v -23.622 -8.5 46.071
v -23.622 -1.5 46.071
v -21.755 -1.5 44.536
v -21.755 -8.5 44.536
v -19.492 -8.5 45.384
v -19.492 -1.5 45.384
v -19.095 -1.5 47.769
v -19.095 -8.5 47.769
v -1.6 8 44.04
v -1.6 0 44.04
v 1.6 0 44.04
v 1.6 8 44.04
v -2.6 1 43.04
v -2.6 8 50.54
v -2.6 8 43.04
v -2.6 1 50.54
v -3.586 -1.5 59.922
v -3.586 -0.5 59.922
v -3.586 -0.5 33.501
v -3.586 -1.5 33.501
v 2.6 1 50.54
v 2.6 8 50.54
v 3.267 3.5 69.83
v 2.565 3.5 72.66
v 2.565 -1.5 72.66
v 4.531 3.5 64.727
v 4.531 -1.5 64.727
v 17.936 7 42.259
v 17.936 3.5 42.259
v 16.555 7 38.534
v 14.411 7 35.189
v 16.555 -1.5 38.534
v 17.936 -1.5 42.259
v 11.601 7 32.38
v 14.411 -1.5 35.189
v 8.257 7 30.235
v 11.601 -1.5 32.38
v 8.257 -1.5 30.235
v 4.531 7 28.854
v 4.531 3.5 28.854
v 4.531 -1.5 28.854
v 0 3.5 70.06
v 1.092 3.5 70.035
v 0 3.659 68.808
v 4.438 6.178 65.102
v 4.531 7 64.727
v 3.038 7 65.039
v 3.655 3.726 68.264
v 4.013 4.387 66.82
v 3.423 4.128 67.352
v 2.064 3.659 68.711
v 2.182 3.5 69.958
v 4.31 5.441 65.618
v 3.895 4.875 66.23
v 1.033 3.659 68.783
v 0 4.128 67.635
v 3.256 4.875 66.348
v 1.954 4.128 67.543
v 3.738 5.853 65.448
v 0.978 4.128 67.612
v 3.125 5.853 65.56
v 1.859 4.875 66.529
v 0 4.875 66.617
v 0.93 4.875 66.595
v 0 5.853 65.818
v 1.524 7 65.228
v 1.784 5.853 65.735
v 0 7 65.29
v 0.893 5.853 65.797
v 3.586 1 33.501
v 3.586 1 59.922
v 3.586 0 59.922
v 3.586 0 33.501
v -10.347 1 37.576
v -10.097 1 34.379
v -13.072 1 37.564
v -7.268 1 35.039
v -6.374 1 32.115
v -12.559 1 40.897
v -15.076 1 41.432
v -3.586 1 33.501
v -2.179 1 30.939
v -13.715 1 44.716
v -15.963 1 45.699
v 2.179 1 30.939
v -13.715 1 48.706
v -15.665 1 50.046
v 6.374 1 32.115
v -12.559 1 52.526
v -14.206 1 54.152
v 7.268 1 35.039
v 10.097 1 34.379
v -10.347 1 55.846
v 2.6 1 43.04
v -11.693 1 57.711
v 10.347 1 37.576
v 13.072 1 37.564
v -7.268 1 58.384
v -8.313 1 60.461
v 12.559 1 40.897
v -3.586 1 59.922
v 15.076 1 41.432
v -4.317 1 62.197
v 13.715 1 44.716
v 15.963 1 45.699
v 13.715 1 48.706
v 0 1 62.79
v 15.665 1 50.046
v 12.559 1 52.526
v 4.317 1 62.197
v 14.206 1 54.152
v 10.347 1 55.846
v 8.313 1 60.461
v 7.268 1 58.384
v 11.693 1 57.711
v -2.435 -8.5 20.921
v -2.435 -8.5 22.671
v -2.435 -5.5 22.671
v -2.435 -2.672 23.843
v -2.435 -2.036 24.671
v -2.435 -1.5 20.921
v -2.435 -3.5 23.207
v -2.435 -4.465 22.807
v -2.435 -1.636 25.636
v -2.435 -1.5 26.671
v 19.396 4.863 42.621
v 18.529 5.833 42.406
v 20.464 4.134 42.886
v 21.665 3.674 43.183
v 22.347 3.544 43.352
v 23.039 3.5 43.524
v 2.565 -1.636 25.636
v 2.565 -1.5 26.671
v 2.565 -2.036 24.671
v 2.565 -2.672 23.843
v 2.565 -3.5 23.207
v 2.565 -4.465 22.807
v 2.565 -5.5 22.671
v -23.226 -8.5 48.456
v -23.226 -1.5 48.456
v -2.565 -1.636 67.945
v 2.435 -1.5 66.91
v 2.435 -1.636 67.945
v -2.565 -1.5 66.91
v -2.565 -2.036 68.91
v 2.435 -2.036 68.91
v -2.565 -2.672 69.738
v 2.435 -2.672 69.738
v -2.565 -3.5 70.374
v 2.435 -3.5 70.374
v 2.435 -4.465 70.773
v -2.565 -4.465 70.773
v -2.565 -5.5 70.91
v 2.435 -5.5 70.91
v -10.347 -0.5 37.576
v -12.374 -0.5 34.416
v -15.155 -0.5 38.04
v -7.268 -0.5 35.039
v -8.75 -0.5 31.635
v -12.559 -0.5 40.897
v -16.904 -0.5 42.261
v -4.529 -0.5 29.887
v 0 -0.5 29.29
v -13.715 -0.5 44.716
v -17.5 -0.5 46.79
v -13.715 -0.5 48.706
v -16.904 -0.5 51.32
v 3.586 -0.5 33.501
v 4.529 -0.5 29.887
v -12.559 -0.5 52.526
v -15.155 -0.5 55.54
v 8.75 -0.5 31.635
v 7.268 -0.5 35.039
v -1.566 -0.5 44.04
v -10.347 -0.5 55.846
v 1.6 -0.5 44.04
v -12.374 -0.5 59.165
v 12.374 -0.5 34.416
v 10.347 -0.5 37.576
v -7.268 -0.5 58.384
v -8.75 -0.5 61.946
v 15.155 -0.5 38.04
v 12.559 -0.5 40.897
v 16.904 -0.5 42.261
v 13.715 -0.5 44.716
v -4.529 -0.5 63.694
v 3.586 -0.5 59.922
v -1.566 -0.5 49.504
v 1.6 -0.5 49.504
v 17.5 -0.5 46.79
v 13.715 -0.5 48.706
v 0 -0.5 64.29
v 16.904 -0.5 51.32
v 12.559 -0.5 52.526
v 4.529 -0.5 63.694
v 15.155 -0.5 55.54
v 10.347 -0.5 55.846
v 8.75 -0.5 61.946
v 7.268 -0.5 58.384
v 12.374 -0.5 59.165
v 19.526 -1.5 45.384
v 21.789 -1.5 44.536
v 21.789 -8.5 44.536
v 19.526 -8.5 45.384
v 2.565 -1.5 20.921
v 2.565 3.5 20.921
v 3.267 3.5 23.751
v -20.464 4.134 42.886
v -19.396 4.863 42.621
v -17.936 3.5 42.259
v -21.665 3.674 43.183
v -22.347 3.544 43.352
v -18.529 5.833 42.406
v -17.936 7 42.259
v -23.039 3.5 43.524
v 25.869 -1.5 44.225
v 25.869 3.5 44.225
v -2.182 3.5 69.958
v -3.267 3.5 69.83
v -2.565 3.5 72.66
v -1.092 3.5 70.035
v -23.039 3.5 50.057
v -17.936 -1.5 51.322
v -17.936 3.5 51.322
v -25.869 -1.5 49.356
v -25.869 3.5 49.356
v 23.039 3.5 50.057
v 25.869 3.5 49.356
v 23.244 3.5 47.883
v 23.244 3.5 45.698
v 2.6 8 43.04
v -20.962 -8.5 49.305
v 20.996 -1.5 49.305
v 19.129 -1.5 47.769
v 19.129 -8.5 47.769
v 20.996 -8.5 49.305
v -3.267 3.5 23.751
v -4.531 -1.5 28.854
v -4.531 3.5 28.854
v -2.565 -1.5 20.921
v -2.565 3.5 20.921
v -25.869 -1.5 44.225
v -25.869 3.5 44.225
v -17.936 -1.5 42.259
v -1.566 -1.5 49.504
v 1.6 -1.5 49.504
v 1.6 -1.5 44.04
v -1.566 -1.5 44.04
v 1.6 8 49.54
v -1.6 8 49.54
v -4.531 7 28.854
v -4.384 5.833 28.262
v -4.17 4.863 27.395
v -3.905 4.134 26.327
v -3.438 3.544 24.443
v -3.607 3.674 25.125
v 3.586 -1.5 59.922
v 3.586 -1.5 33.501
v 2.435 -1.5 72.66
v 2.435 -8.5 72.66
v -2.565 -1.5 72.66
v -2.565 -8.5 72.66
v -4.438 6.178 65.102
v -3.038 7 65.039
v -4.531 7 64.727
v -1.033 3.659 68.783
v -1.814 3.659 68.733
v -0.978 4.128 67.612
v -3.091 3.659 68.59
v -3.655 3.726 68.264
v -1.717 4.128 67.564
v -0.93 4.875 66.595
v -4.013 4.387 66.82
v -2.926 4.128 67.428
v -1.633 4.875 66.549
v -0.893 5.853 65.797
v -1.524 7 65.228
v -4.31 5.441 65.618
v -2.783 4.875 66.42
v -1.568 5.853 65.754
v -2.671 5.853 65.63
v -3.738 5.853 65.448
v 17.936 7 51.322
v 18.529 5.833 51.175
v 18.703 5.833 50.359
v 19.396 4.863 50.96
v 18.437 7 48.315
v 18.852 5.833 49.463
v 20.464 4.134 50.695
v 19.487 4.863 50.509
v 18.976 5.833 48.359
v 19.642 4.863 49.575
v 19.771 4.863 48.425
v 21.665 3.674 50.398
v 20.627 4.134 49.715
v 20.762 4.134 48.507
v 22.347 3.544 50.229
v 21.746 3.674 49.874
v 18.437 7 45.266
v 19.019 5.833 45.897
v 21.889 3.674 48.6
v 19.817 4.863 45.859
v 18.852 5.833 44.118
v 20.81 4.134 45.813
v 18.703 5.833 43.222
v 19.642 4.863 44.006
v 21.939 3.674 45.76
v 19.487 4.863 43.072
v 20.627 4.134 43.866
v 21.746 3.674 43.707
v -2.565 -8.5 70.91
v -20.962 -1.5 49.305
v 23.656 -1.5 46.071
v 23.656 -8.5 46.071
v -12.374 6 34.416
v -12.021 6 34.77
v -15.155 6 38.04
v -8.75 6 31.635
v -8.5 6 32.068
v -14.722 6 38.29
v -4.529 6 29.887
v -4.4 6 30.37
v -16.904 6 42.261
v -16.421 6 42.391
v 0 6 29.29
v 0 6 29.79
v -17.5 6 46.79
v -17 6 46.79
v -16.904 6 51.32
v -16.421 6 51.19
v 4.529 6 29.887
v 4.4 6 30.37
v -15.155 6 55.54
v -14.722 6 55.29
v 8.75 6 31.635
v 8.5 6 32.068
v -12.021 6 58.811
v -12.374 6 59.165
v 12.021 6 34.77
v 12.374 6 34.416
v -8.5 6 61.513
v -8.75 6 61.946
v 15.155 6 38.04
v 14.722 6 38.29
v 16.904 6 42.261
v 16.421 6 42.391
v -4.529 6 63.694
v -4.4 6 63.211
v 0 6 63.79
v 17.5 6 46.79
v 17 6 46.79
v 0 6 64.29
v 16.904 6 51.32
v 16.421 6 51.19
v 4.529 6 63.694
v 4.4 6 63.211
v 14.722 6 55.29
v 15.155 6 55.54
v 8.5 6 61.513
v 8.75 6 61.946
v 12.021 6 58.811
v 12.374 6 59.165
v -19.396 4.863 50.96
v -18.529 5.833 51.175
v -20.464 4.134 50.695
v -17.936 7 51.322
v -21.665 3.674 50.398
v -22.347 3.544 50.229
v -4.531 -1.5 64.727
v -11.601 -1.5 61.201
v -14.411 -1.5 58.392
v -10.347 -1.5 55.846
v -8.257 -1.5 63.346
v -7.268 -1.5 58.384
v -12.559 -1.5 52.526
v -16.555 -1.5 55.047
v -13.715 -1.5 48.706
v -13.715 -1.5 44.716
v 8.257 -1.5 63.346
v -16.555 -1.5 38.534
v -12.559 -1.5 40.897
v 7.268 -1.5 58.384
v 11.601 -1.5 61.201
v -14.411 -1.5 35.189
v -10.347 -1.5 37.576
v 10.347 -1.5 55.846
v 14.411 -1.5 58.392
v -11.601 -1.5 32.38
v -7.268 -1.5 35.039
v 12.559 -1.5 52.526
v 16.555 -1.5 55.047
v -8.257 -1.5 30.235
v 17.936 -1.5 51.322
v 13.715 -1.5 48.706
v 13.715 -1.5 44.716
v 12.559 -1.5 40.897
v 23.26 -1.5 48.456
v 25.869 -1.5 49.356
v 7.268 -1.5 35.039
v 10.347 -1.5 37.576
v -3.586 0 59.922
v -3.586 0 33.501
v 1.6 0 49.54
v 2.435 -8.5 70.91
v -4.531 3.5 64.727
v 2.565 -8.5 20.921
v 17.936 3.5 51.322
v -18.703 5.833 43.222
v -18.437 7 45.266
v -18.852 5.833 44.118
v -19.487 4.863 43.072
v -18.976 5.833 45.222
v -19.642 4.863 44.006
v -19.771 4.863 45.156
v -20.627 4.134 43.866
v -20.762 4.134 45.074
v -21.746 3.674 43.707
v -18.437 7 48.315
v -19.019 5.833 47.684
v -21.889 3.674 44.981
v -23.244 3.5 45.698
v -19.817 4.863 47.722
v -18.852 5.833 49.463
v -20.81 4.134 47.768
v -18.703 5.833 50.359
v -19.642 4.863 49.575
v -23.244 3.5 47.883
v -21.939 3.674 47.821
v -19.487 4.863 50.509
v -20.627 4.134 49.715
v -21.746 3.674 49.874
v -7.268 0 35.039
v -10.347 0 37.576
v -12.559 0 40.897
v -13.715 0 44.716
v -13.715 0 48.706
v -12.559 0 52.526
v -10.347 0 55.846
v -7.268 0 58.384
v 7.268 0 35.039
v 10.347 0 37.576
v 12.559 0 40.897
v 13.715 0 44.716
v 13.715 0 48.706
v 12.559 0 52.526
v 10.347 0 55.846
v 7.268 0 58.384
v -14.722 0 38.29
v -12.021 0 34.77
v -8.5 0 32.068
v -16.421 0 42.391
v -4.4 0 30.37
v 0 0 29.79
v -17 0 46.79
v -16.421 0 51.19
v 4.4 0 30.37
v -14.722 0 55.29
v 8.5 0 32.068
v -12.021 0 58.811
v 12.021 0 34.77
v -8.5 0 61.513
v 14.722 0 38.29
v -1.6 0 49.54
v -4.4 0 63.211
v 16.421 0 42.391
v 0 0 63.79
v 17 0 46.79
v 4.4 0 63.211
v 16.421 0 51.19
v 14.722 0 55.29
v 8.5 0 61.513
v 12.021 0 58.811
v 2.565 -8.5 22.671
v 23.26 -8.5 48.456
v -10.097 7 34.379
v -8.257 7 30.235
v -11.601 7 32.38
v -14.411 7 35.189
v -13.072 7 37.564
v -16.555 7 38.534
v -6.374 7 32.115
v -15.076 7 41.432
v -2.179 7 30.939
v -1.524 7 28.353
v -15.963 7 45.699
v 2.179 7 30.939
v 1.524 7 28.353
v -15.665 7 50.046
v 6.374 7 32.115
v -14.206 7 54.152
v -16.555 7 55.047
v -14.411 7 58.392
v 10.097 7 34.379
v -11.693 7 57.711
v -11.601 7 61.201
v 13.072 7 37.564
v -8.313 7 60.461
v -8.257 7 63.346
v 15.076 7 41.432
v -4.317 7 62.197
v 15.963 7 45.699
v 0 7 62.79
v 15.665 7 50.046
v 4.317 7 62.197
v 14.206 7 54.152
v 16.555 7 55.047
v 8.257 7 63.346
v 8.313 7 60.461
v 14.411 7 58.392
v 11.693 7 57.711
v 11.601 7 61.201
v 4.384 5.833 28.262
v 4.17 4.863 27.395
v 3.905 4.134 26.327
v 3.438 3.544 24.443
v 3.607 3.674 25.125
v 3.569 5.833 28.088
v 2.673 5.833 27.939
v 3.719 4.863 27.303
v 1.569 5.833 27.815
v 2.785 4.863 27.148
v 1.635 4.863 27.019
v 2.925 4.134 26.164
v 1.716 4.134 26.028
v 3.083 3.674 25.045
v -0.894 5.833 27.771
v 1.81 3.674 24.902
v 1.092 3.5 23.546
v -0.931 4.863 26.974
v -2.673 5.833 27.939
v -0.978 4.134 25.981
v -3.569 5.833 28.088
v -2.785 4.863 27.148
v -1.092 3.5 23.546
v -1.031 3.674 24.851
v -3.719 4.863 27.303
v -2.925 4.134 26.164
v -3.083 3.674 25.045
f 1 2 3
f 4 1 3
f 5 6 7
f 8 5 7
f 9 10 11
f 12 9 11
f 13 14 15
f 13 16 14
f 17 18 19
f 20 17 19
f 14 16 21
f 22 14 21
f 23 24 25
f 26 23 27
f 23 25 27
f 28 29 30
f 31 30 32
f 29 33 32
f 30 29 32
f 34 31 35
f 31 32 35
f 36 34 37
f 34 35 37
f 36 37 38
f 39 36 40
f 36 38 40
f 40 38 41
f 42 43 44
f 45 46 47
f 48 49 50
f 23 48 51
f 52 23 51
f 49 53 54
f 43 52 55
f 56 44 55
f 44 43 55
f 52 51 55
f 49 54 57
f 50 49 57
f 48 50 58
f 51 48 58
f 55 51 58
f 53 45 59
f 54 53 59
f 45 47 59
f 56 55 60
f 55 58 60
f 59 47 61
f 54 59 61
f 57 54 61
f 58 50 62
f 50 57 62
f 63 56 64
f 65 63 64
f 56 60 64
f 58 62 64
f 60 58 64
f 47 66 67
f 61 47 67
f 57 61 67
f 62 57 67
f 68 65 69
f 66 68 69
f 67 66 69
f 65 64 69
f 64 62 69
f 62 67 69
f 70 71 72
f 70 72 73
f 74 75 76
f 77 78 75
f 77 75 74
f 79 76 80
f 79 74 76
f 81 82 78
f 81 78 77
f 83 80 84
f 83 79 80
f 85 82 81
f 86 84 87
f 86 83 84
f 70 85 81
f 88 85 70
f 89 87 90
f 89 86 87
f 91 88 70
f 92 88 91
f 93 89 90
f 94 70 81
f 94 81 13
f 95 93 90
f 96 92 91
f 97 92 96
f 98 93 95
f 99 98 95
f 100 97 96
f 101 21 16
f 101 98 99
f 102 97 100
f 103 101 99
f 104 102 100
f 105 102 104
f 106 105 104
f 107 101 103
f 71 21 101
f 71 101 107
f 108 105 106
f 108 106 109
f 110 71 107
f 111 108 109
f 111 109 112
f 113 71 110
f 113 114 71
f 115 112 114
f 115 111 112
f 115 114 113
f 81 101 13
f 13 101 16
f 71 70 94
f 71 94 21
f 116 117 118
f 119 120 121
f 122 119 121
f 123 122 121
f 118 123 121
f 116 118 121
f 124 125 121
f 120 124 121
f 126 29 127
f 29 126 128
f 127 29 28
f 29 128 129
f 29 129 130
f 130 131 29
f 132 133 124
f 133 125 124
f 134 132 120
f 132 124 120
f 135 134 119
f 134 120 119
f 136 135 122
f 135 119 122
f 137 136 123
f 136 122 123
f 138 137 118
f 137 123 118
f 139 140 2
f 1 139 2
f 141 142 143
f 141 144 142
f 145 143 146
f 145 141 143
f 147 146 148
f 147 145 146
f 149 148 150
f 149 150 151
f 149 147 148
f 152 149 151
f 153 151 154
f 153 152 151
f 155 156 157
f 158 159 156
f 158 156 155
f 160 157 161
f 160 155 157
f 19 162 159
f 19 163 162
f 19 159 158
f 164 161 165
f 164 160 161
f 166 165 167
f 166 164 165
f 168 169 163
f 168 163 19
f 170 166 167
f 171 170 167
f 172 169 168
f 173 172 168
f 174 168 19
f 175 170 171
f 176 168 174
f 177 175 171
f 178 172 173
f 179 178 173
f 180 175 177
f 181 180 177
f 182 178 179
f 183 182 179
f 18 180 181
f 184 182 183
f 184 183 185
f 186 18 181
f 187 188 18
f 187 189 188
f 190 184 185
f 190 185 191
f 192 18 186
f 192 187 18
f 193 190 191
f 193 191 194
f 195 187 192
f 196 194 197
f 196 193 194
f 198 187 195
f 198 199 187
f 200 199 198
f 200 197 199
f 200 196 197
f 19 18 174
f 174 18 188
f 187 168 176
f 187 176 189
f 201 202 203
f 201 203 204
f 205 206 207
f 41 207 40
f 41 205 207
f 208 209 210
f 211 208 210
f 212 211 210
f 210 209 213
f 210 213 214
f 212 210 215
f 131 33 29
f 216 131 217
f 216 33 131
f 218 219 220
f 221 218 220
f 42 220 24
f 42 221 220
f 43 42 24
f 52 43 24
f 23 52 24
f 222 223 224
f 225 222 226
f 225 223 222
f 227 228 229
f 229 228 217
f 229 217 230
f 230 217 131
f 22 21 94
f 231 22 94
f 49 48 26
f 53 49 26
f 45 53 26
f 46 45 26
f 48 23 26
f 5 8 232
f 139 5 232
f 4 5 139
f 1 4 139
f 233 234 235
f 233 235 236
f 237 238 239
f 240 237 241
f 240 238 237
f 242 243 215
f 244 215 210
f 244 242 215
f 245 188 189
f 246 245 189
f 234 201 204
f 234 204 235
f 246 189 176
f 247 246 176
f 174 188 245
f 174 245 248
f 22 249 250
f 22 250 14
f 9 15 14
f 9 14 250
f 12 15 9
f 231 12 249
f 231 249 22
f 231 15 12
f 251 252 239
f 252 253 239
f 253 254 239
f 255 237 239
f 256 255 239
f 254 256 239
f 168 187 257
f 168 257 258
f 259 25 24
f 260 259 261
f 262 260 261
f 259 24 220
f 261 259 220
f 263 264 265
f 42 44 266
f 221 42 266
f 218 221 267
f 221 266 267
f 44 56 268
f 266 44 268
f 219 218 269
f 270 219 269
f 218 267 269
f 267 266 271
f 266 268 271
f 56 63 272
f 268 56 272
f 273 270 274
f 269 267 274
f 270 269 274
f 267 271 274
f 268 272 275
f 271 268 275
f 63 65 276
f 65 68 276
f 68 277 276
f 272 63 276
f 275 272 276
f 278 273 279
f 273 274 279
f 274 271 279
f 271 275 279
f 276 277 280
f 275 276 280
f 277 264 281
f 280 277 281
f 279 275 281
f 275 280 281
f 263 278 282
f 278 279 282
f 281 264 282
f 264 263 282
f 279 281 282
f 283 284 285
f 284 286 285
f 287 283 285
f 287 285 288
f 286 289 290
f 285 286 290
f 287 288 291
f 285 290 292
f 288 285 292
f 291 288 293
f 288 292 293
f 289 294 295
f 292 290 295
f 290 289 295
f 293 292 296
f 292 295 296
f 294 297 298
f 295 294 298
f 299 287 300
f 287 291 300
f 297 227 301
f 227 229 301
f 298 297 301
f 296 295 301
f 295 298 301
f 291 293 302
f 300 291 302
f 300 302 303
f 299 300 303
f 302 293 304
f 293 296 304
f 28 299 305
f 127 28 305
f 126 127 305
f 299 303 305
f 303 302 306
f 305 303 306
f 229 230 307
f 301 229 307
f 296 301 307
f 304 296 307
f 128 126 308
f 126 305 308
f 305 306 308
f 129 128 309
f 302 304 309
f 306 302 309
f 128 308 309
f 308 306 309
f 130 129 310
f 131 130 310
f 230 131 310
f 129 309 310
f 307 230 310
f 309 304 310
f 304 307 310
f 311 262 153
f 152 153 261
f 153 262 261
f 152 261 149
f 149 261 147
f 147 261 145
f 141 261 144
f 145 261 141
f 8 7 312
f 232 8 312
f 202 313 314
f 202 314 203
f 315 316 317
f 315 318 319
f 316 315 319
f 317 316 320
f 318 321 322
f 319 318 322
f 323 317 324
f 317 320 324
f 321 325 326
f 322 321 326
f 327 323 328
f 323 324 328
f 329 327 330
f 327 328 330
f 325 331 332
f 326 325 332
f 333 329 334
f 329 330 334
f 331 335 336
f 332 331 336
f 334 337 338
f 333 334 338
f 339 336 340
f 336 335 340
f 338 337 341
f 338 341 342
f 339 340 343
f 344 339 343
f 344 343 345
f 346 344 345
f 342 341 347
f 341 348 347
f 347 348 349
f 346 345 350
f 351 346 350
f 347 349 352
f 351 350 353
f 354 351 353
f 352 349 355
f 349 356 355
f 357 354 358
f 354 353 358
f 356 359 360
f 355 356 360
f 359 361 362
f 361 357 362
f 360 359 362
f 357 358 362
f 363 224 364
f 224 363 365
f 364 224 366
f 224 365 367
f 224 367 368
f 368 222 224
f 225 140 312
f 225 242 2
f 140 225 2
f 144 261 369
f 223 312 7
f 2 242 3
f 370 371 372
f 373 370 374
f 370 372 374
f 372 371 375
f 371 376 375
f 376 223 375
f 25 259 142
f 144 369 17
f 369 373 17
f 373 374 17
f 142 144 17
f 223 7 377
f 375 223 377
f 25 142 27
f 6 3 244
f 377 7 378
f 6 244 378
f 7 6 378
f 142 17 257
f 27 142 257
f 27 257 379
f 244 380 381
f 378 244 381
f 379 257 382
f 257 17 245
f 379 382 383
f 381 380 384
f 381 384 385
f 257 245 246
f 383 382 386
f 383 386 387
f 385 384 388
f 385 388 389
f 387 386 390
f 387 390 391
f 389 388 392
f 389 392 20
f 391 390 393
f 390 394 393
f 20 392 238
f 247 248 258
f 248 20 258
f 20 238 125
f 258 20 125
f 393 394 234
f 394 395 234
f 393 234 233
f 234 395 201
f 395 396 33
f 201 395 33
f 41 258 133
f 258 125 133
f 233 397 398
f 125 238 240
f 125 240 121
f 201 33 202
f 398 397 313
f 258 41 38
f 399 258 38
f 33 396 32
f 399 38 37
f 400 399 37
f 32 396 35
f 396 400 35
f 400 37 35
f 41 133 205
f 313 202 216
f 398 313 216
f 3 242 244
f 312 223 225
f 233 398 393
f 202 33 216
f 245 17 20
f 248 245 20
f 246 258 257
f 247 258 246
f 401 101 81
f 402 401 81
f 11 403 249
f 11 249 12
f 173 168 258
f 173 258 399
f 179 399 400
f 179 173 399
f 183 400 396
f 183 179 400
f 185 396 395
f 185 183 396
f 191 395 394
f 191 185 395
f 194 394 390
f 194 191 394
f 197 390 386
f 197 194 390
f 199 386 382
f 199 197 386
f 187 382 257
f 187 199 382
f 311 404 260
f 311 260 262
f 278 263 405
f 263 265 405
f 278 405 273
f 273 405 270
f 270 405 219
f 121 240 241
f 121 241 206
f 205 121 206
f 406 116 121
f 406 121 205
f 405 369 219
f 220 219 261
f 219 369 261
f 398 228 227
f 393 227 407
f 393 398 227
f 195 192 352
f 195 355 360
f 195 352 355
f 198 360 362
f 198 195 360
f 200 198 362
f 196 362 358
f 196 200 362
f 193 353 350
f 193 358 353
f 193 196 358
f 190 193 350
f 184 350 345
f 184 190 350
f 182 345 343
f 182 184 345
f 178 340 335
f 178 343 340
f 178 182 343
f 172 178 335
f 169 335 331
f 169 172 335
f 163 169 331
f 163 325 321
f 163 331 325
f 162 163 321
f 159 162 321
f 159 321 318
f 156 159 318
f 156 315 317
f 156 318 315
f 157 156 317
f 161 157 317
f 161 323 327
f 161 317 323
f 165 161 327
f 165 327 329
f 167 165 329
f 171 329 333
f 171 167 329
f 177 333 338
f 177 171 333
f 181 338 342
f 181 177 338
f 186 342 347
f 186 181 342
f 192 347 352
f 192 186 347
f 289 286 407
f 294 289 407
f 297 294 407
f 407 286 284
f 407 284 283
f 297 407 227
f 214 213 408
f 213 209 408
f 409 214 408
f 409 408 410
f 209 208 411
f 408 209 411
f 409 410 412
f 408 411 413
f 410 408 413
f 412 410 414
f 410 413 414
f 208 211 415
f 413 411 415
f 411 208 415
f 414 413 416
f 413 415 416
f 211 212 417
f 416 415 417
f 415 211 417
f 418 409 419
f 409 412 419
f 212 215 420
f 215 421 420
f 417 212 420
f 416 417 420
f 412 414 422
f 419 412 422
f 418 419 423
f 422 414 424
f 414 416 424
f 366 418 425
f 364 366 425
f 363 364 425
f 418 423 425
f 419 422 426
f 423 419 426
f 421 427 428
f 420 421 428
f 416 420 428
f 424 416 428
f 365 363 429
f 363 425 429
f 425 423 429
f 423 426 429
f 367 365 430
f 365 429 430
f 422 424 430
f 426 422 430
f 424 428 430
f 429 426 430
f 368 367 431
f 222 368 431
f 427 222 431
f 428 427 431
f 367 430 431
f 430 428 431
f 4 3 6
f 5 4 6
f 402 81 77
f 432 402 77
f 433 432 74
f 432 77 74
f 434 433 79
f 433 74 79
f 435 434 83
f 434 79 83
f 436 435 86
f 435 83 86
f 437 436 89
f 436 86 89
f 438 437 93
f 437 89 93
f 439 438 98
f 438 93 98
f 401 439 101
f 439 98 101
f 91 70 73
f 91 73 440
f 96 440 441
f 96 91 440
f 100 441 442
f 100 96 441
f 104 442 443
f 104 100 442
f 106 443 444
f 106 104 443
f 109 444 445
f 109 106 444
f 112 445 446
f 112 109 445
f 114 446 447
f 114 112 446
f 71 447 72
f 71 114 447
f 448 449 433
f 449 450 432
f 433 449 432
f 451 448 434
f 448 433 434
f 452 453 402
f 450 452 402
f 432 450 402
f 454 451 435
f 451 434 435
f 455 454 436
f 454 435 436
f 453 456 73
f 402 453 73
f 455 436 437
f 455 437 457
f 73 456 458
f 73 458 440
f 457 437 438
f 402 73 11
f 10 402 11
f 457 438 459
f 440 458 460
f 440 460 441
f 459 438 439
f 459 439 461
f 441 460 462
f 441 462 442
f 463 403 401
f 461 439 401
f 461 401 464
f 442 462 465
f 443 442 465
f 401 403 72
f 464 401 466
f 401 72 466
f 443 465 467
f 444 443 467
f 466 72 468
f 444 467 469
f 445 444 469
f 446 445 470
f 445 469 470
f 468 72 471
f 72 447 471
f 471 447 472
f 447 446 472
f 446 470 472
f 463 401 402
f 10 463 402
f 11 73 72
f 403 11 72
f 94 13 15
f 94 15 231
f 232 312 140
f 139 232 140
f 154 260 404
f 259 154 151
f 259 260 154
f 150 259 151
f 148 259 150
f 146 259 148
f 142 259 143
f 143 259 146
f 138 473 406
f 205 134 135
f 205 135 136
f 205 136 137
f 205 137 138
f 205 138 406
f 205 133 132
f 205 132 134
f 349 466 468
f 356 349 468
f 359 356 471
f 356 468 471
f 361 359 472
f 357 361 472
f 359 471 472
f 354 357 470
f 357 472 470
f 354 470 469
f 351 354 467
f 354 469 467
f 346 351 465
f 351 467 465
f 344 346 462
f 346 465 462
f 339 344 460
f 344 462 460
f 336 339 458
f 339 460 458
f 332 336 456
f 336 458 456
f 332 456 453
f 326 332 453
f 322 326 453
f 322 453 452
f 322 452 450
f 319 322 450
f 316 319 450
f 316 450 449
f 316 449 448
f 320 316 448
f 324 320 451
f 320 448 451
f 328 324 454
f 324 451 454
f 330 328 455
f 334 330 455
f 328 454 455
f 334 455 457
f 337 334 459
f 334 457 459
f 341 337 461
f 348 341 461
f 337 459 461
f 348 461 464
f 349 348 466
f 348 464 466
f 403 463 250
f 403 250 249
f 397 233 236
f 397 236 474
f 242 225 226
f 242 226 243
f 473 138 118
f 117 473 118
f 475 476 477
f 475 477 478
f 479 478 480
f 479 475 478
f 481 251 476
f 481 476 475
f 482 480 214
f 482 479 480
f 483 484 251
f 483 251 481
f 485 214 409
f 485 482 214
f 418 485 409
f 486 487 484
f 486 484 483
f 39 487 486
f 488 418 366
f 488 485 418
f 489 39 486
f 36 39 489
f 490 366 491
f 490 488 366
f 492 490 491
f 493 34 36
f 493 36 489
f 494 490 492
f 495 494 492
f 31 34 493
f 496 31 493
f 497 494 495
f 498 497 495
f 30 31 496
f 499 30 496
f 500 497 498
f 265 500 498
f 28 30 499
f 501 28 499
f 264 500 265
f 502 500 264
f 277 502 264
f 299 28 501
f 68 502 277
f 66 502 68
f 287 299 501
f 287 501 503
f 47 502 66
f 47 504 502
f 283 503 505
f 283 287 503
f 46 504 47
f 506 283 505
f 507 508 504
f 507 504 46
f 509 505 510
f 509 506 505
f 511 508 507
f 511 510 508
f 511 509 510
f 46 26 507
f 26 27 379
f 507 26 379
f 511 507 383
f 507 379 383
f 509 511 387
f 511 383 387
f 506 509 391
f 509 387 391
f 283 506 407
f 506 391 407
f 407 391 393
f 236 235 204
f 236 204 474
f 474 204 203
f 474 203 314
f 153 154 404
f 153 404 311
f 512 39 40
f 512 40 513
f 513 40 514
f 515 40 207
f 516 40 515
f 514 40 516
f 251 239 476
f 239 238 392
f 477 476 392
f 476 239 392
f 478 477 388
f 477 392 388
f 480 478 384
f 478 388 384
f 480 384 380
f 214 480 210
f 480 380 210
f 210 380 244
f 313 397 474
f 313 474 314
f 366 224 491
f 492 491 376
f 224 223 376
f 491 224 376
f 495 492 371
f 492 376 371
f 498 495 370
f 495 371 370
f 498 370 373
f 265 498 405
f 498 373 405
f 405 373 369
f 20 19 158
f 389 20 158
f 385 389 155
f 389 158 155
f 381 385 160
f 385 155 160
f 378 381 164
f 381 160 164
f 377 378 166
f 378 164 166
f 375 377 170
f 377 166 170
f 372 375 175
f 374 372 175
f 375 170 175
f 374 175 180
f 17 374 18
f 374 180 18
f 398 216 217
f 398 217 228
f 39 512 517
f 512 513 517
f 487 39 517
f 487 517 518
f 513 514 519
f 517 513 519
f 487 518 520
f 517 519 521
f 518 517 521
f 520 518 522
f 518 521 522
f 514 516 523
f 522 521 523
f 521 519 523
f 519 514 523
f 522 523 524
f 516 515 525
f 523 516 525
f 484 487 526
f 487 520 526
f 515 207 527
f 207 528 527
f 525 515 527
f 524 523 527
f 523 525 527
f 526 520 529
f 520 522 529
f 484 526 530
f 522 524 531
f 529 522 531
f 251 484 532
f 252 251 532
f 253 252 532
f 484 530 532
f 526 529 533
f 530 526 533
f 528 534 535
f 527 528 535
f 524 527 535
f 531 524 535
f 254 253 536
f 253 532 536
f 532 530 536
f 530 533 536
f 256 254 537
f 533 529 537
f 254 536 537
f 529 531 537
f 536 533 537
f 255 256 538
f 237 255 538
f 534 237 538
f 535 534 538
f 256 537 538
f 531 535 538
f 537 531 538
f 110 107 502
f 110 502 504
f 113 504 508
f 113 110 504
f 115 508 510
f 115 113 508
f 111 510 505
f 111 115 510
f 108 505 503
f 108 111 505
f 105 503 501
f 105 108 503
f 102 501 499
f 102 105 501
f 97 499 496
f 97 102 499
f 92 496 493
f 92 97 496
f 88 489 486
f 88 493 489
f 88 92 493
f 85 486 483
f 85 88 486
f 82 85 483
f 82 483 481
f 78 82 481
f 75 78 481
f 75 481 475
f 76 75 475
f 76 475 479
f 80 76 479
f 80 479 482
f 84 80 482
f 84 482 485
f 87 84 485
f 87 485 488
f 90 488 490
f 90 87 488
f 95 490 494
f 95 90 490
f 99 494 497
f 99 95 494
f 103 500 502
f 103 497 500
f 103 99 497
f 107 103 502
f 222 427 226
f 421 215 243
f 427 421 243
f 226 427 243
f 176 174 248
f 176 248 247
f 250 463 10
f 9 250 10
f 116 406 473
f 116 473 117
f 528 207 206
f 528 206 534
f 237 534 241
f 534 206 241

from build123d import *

# Parameters (mm, degrees)
SKETCH4_R                = 17
BOSS_EXTRUDE3_DEPTH      = 6
SHELL4_T                 = 0.5
SKETCH5_W                = 3.2
SKETCH5_H                = 5.5
BOSS_EXTRUDE4_DEPTH      = 8
SHELL5_T                 = 1
BOSS_EXTRUDE6_DEPTH      = 3.5
BOSS_EXTRUDE6_DEPTH_BACK = 1.5
SKETCH7_W                = 5
SKETCH7_H                = 1.75
BOSS_EXTRUDE7_DEPTH      = 7
FILLET3_R                = 5
CUT_EXTRUDE1_DEPTH       = 5
SKETCH13_W               = 3.166032567
SKETCH13_H               = 5.463514234
CUT_EXTRUDE2_DEPTH       = 5
FILLET4_R                = 4
BOSS_EXTRUDE8_DEPTH      = 7


with BuildPart() as part:
    # Sketch4 → Boss-Extrude3 (new body)
    with BuildSketch(Plane(origin=(0, 0, 0), x_dir=(1, 0, 0), z_dir=(0, 1, 0))):
        with Locations(Location((0, -46.79046007, 0), (0, 0, 270))):
            Circle(SKETCH4_R)
    extrude(amount=BOSS_EXTRUDE3_DEPTH)

    # Shell4
    shell4_openings = [part.faces().sort_by_distance(p)[0] for p in [
        (0, 6, 46.79046007),
    ]]
    offset(amount=SHELL4_T, openings=shell4_openings, kind=Kind.INTERSECTION)

    # Sketch5 → Boss-Extrude4 (add)
    with BuildSketch(Plane(origin=(0, 0, 0), x_dir=(1, 0, 0), z_dir=(0, 1, 0))):
        with Locations((0, -46.79046007)):
            Rectangle(SKETCH5_W, SKETCH5_H)
    extrude(amount=BOSS_EXTRUDE4_DEPTH)

    # Shell5
    shell5_openings = [part.faces().sort_by_distance(p)[0] for p in [
        (0, 8, 46.79046007),
    ]]
    offset(amount=SHELL5_T, openings=shell5_openings, kind=Kind.INTERSECTION)

    # Sketch6 → Boss-Extrude6 (add, two sides: drawn at the far end of the back side and taken through both)
    with BuildSketch(Plane(origin=(0, 0, 0), x_dir=(1, 0, 0), z_dir=(0, 1, 0)).offset(-BOSS_EXTRUDE6_DEPTH_BACK)):
        with BuildLine():
            Line((-2.565219646, -72.659781842), (2.565219646, -72.659781842))
            Line((2.565219646, -72.659781842), (4.531236217, -64.726956337))
            ThreePointArc((4.531236217, -64.726956337), (0, -65.29046007), (-4.531236217, -64.726956337))
            Line((-4.531236217, -64.726956337), (-2.565219646, -72.659781842))
        make_face()
        with BuildLine():
            Line((-25.869321772, -44.225240424), (-17.936496267, -42.259223853))
            ThreePointArc((-17.936496267, -42.259223853), (-18.5, -46.79046007), (-17.936496267, -51.321696288))
            Line((-17.936496267, -51.321696288), (-25.869321772, -49.355679717))
            Line((-25.869321772, -49.355679717), (-25.869321772, -44.225240424))
        make_face()
        with BuildLine():
            Line((2.565219646, -20.921138298), (4.531236217, -28.853963803))
            ThreePointArc((4.531236217, -28.853963803), (0, -28.29046007), (-4.531236217, -28.853963803))
            Line((-4.531236217, -28.853963803), (-2.565219646, -20.921138298))
            Line((-2.565219646, -20.921138298), (2.565219646, -20.921138298))
        make_face()
        with BuildLine():
            Line((25.869321772, -49.355679717), (17.936496267, -51.321696288))
            ThreePointArc((17.936496267, -51.321696288), (18.5, -46.79046007), (17.936496267, -42.259223853))
            Line((17.936496267, -42.259223853), (25.869321772, -44.225240424))
            Line((25.869321772, -44.225240424), (25.869321772, -49.355679717))
        make_face()
    extrude(amount=BOSS_EXTRUDE6_DEPTH + BOSS_EXTRUDE6_DEPTH_BACK)

    # Sketch7 → Boss-Extrude7 (add)
    with BuildSketch(Plane(origin=(0, -1.5, 0), x_dir=(-1, 0, 0), z_dir=(0, -1, 0))):
        with Locations((0.065219646, -71.784781842)):
            Rectangle(SKETCH7_W, SKETCH7_H)
        with Locations((-0.065219646, -21.796138298)):
            Rectangle(SKETCH7_W, SKETCH7_H)
    extrude(amount=BOSS_EXTRUDE7_DEPTH)

    # Fillet3
    # the kernel refuses this fillet: 5 mm, written as the material it adds along each edge
    with BuildSketch(Plane(origin=(0, 3.5, 46.79046007), x_dir=(-0.6278344871312538, 0, -0.7783468743231616), z_dir=(0.7783468743231616, 0, -0.6278344871312538))) as fillet3_piece_1_section:
        with BuildLine():
            CenterArc((23.269696007, 5), FILLET3_R, 197.457603124, 72.542396876)
            Line((23.269696007, 0), (23.269696007, -0.1))
            Line((23.269696007, -0.1), (18.5, -0.1))
            Line((18.5, -0.1), (18.4, 0))
            ThreePointArc((18.4, 0), (18.4, 1.75), (18.40460608, 3.47))
            Line((18.40460608, 3.47), (18.5, 3.5))
        make_face()
    fillet3_piece_1 = revolve(axis=Axis((0, 3.5, 46.79046007), (0, 1, 0)), revolution_arc=102.218929963, mode=Mode.PRIVATE)
    fillet3_piece_1 = split(fillet3_piece_1, bisect_by=Plane(origin=(-20.380505818, 4.426759582, 42.864930265), z_dir=(0.24055555302697984, 0, 0.9706353722731745)), keep=Keep.TOP, mode=Mode.PRIVATE)
    fillet3_piece_1 = split(fillet3_piece_1, bisect_by=Plane(origin=(-20.380505744, 4.426759582, 50.715989893), z_dir=(0.24055555302697348, 0, -0.9706353722731761)), keep=Keep.TOP, mode=Mode.PRIVATE)
    add(fillet3_piece_1)
    with BuildSketch(Plane(origin=(0, 3.5, 46.79046007), x_dir=(0.7783347748418207, 0, 0.6278494869568123), z_dir=(0.6278494869568123, 0, -0.7783347748418207))) as fillet3_piece_2_section:
        with BuildLine():
            CenterArc((23.269696007, -5), FILLET3_R, 90, 72.542396876)
            Line((23.269696007, 0), (23.269696007, 0.1))
            Line((23.269696007, 0.1), (18.5, 0.1))
            Line((18.5, 0.1), (18.4, 0))
            ThreePointArc((18.4, 0), (18.4, -1.75), (18.40460608, -3.47))
            Line((18.40460608, -3.47), (18.5, -3.5))
        make_face()
    fillet3_piece_2 = revolve(axis=Axis((0, 3.5, 46.79046007), (0, -1, 0)), revolution_arc=51.108360804, mode=Mode.PRIVATE)
    fillet3_piece_2 = split(fillet3_piece_2, bisect_by=Plane(origin=(4.048850537, 4.426759722, 66.673369956), z_dir=(-0.970635372273176, 0, -0.24055555302697343)), keep=Keep.TOP, mode=Mode.PRIVATE)
    add(fillet3_piece_2)
    with BuildSketch(Plane(origin=(0, 3.5, 46.79046007), x_dir=(0.7783468743230912, 0, -0.6278344871313409), z_dir=(0.6278344871313409, 0, 0.7783468743230912))) as fillet3_piece_3_section:
        with BuildLine():
            CenterArc((23.269696007, 5), FILLET3_R, 197.457603124, 72.542396876)
            Line((23.269696007, 0), (23.269696007, -0.1))
            Line((23.269696007, -0.1), (18.5, -0.1))
            Line((18.5, -0.1), (18.4, 0))
            ThreePointArc((18.4, 0), (18.4, 1.75), (18.40460608, 3.47))
            Line((18.40460608, 3.47), (18.5, 3.5))
        make_face()
    fillet3_piece_3 = revolve(axis=Axis((0, 3.5, 46.79046007), (0, 1, 0)), revolution_arc=102.218929963, mode=Mode.PRIVATE)
    fillet3_piece_3 = split(fillet3_piece_3, bisect_by=Plane(origin=(3.925529805, 4.426759582, 26.409954252), z_dir=(-0.9706353722731743, 0, 0.24055555302698087)), keep=Keep.TOP, mode=Mode.PRIVATE)
    fillet3_piece_3 = split(fillet3_piece_3, bisect_by=Plane(origin=(-3.925529823, 4.426759582, 26.409954326), z_dir=(0.9706353722731764, 0, 0.2405555530269717)), keep=Keep.TOP, mode=Mode.PRIVATE)
    add(fillet3_piece_3)
    with BuildSketch(Plane(origin=(0, 3.5, 46.79046007), x_dir=(0.6278344871312218, 0, 0.7783468743231875), z_dir=(-0.7783468743231875, 0, 0.6278344871312218))) as fillet3_piece_4_section:
        with BuildLine():
            CenterArc((23.269696007, 5), FILLET3_R, 197.457603124, 72.542396876)
            Line((23.269696007, 0), (23.269696007, -0.1))
            Line((23.269696007, -0.1), (18.5, -0.1))
            Line((18.5, -0.1), (18.4, 0))
            ThreePointArc((18.4, 0), (18.4, 1.75), (18.40460608, 3.47))
            Line((18.40460608, 3.47), (18.5, 3.5))
        make_face()
    fillet3_piece_4 = revolve(axis=Axis((0, 3.5, 46.79046007), (0, 1, 0)), revolution_arc=102.218929963, mode=Mode.PRIVATE)
    fillet3_piece_4 = split(fillet3_piece_4, bisect_by=Plane(origin=(20.380505818, 4.426759582, 50.715989875), z_dir=(-0.24055555302698112, 0, -0.9706353722731741)), keep=Keep.TOP, mode=Mode.PRIVATE)
    fillet3_piece_4 = split(fillet3_piece_4, bisect_by=Plane(origin=(20.380505744, 4.426759582, 42.864930247), z_dir=(-0.24055555302697304, 0, 0.9706353722731761)), keep=Keep.TOP, mode=Mode.PRIVATE)
    add(fillet3_piece_4)
    with BuildSketch(Plane(origin=(0, 3.5, 46.79046007), x_dir=(0, 0, 1), z_dir=(1, 0, 0))) as fillet3_piece_5_section:
        with BuildLine():
            CenterArc((23.269696007, -5), FILLET3_R, 90, 72.542396876)
            Line((23.269696007, 0), (23.269696007, 0.1))
            Line((23.269696007, 0.1), (18.5, 0.1))
            Line((18.5, 0.1), (18.4, 0))
            ThreePointArc((18.4, 0), (18.4, -1.75), (18.40460608, -3.47))
            Line((18.40460608, -3.47), (18.5, -3.5))
        make_face()
    fillet3_piece_5 = revolve(axis=Axis((0, 3.5, 46.79046007), (0, -1, 0)), revolution_arc=51.108360804, mode=Mode.PRIVATE)
    fillet3_piece_5 = split(fillet3_piece_5, bisect_by=Plane(origin=(-4.04885046, 4.426759578, 66.673370268), z_dir=(0.9706353722731745, 0, -0.24055555302697917)), keep=Keep.TOP, mode=Mode.PRIVATE)
    add(fillet3_piece_5)

    # Sketch11 → Cut-Extrude1 (cut)
    with BuildSketch(Plane(origin=(0, 1, 0), x_dir=(1, 0, 0), z_dir=(0, 1, 0))):
        with BuildLine():
            Line((-3.585868376, -59.921550203), (-3.585868376, -33.501237191))
            ThreePointArc((-3.585868376, -33.501237191), (-13.861572731, -46.711393697), (-3.585868376, -59.921550203))
        make_face()
        with BuildLine():
            Line((3.585868376, -59.921550203), (3.585868376, -33.501237191))
            ThreePointArc((3.585868376, -33.501237191), (13.861572731, -46.711393697), (3.585868376, -59.921550203))
        make_face()
    extrude(amount=-CUT_EXTRUDE1_DEPTH, mode=Mode.SUBTRACT)

    # Sketch13 → Cut-Extrude2 (cut)
    with BuildSketch(Plane(origin=(0, -0.5, 0), x_dir=(1, 0, 0), z_dir=(0, 1, 0))):
        with Locations((0.016983716, -46.772217187)):
            Rectangle(SKETCH13_W, SKETCH13_H)
    extrude(amount=-CUT_EXTRUDE2_DEPTH, mode=Mode.SUBTRACT)

    # Fillet4
    fillet4_edges = [part.edges().sort_by_distance(p)[0] for p in [
        (0.065219646, -1.5, 22.671138298),
        (-0.065219646, -1.5, 70.909781842),
    ]]
    fillet(fillet4_edges, radius=FILLET4_R)

    # Sketch16 → Boss-Extrude8 (add)
    with BuildSketch(Plane(origin=(0, -1.5, 0), x_dir=(-1, 0, 0), z_dir=(0, -1, 0))):
        Polygon((19.095115037, -47.769177252), (20.96203058, -49.305079029), (23.225618307, -48.456233631), (23.622290493, -46.071486456), (21.75537495, -44.535584679), (19.491787223, -45.384430077), align=None)
        Polygon((-19.525754656, -45.384430077), (-19.12908247, -47.769177252), (-20.995998013, -49.305079029), (-23.25958574, -48.456233631), (-23.656257926, -46.071486456), (-21.789342383, -44.535584679), align=None)
    extrude(amount=BOSS_EXTRUDE8_DEPTH)


solid = part.part
